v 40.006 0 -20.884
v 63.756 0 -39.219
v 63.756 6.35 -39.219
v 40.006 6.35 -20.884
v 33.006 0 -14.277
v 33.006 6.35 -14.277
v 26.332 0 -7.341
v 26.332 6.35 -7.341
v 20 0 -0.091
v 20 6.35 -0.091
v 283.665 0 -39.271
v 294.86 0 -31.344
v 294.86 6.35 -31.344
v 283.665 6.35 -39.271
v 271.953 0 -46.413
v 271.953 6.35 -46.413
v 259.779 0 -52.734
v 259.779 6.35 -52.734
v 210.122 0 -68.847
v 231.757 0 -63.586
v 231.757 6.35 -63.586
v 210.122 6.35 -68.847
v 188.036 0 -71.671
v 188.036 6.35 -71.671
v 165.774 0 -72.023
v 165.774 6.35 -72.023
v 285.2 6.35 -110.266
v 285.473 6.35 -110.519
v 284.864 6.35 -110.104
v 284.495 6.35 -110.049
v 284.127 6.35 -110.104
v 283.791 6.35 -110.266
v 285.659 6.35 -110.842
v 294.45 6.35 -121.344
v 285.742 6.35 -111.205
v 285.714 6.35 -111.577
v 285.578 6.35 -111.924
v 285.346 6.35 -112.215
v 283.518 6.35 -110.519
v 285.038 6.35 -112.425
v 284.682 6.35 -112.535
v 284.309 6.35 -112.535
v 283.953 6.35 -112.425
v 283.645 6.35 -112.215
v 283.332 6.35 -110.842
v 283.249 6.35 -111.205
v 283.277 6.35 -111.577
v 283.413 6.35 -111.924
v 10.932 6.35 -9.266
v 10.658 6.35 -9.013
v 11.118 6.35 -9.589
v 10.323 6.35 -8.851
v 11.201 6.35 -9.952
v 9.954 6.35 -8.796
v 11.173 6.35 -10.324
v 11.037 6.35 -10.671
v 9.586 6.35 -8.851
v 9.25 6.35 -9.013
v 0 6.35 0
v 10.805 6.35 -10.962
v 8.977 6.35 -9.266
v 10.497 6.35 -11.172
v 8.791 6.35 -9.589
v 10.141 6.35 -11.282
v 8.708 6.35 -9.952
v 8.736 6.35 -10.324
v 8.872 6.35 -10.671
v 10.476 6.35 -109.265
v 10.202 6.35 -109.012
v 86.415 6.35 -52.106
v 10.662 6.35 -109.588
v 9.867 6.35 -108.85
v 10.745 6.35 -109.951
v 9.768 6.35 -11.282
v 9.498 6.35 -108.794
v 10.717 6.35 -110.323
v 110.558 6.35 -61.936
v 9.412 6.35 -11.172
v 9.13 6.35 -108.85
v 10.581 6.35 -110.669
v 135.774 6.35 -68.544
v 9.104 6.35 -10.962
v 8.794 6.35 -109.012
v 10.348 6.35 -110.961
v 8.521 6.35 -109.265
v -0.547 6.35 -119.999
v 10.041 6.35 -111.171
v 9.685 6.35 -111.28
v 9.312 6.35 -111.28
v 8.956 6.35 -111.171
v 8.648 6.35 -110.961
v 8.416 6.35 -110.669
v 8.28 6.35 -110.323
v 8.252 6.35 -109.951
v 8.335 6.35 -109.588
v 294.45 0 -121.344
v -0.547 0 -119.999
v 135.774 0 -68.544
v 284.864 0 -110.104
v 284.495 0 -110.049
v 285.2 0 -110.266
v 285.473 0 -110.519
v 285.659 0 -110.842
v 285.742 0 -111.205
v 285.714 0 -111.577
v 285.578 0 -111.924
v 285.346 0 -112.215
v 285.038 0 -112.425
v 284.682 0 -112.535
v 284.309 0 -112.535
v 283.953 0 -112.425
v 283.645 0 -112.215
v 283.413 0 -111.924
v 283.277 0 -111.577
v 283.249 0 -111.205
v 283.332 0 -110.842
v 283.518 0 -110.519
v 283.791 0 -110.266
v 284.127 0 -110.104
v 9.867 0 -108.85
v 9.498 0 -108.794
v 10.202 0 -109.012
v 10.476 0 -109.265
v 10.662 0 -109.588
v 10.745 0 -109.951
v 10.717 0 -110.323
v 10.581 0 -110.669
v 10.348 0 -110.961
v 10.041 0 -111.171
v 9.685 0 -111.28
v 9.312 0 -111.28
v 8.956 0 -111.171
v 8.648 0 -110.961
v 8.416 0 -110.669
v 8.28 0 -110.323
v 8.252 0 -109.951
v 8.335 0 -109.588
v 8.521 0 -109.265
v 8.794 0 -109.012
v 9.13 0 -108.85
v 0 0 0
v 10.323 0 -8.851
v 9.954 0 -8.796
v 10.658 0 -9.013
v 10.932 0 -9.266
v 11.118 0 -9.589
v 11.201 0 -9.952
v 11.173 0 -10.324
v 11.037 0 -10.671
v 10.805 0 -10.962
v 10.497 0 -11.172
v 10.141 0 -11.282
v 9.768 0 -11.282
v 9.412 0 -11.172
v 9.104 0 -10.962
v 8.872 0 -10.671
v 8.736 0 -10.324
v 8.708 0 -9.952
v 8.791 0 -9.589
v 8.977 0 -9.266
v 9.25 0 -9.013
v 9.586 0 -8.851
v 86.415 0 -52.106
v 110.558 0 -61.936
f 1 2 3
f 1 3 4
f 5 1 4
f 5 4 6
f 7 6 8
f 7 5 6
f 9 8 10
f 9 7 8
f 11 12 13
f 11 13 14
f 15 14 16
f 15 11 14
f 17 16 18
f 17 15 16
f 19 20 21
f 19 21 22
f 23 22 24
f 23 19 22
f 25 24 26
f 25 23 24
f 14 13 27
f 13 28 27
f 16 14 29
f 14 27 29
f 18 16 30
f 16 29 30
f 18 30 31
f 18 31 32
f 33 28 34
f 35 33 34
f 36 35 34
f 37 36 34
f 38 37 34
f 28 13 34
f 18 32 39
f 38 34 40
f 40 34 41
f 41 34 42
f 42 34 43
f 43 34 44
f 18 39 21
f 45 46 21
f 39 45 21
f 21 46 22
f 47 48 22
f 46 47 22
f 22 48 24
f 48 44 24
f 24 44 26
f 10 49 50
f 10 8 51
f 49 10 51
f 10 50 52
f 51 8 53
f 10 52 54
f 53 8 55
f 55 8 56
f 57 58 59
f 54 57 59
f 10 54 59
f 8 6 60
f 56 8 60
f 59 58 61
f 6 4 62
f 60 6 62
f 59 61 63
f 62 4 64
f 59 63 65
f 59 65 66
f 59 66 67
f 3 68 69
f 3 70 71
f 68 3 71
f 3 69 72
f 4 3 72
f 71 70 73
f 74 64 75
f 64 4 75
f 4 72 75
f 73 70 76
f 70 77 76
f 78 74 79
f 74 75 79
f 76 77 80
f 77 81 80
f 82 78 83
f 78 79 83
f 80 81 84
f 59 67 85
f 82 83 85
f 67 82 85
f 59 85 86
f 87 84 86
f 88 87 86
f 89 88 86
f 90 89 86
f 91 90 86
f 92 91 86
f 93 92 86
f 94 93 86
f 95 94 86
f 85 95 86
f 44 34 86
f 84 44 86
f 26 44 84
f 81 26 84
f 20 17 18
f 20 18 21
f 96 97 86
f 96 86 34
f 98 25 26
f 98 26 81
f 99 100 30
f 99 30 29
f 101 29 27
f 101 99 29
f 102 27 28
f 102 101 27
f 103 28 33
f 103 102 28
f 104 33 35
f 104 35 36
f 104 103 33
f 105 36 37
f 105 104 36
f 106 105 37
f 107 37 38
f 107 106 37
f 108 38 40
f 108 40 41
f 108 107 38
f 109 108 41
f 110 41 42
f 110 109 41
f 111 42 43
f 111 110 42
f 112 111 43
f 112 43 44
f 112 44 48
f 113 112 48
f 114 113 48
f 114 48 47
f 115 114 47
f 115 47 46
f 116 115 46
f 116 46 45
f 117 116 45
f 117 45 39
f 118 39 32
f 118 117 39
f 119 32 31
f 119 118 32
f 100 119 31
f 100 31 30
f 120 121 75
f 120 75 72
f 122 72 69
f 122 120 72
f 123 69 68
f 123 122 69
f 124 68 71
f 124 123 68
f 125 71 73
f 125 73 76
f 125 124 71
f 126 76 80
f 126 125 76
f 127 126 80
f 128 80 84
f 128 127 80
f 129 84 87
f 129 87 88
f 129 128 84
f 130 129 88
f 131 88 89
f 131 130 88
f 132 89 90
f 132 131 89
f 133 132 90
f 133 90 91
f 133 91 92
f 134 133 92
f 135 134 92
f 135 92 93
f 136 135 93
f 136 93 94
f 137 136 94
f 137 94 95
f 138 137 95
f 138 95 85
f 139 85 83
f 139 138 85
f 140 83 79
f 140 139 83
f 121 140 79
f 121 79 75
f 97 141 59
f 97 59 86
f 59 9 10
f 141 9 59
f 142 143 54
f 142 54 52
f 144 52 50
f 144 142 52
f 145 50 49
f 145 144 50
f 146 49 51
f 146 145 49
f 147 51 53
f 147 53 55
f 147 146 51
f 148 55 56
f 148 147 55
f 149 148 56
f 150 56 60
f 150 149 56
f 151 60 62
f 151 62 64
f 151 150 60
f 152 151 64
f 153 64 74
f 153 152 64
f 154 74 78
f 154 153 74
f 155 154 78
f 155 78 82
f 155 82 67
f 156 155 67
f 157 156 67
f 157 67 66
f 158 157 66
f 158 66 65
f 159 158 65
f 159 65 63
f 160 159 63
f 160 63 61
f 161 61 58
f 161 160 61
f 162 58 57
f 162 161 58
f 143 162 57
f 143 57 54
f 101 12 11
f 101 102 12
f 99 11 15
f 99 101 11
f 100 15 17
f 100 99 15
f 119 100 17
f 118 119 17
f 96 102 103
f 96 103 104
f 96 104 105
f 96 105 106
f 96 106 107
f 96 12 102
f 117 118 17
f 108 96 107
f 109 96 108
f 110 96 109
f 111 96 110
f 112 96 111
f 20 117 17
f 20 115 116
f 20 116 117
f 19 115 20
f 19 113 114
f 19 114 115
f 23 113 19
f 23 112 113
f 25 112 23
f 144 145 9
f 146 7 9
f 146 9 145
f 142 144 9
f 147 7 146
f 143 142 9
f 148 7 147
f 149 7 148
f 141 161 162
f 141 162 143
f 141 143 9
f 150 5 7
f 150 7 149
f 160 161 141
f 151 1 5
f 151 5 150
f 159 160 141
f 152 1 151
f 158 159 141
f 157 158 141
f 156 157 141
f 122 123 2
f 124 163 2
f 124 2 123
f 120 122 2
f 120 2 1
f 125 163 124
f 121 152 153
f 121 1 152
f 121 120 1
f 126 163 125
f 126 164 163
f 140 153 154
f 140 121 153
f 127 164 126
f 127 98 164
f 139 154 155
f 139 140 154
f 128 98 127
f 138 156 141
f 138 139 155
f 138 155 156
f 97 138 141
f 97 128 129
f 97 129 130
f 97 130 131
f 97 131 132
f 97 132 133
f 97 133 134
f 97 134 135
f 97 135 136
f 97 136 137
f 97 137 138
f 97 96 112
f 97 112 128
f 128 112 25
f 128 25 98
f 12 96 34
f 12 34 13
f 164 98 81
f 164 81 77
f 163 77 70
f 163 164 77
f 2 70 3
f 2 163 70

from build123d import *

# Parameters (mm, degrees)
SKETCH1_R           = 1.25
BOSS_EXTRUDE1_DEPTH = 6.35


with BuildPart() as part:
    # Sketch1 → Boss-Extrude1 (new body)
    with BuildSketch(Plane(origin=(0, 0, 0), x_dir=(1, 0, 0), z_dir=(0, 1, 0))):
        with BuildLine():
            Line((19.999792019, 0.091209594), (0, 0))
            Line((0, 0), (-0.547257564, 119.998752115))
            Line((-0.547257564, 119.998752115), (294.449674718, 121.344093627))
            Line((294.449674718, 121.344093627), (294.86012216, 31.344093627))
            ThreePointArc((294.86012216, 31.344093627), (277.870515385, 42.942471612), (259.779400189, 52.734338707))
            Line((259.779400189, 52.734338707), (231.756657954, 63.5857763))
            ThreePointArc((231.756657954, 63.5857763), (199.118358441, 70.566953886), (165.773569429, 72.023141123))
            Line((165.773569429, 72.023141123), (135.773569429, 68.543550593))
            ThreePointArc((135.773569429, 68.543550593), (98.326093616, 57.414966094), (63.756361786, 39.21901932))
            Line((63.756361786, 39.21901932), (40.005697256, 20.884351348))
            ThreePointArc((40.005697256, 20.884351348), (29.627268731, 10.849040712), (19.999792019, 0.091209594))
        make_face()
        with Locations(Location((9.498243242, 110.044460902, 0), (0, 0, 270))):
            Circle(SKETCH1_R, mode=Mode.SUBTRACT)
        with Locations(Location((9.954291213, 10.045500807, 0), (0, 0, 270))):
            Circle(SKETCH1_R, mode=Mode.SUBTRACT)
        with Locations(Location((284.495383506, 111.298592821, 0), (0, 0, 270))):
            Circle(SKETCH1_R, mode=Mode.SUBTRACT)
    extrude(amount=BOSS_EXTRUDE1_DEPTH)


solid = part.part
